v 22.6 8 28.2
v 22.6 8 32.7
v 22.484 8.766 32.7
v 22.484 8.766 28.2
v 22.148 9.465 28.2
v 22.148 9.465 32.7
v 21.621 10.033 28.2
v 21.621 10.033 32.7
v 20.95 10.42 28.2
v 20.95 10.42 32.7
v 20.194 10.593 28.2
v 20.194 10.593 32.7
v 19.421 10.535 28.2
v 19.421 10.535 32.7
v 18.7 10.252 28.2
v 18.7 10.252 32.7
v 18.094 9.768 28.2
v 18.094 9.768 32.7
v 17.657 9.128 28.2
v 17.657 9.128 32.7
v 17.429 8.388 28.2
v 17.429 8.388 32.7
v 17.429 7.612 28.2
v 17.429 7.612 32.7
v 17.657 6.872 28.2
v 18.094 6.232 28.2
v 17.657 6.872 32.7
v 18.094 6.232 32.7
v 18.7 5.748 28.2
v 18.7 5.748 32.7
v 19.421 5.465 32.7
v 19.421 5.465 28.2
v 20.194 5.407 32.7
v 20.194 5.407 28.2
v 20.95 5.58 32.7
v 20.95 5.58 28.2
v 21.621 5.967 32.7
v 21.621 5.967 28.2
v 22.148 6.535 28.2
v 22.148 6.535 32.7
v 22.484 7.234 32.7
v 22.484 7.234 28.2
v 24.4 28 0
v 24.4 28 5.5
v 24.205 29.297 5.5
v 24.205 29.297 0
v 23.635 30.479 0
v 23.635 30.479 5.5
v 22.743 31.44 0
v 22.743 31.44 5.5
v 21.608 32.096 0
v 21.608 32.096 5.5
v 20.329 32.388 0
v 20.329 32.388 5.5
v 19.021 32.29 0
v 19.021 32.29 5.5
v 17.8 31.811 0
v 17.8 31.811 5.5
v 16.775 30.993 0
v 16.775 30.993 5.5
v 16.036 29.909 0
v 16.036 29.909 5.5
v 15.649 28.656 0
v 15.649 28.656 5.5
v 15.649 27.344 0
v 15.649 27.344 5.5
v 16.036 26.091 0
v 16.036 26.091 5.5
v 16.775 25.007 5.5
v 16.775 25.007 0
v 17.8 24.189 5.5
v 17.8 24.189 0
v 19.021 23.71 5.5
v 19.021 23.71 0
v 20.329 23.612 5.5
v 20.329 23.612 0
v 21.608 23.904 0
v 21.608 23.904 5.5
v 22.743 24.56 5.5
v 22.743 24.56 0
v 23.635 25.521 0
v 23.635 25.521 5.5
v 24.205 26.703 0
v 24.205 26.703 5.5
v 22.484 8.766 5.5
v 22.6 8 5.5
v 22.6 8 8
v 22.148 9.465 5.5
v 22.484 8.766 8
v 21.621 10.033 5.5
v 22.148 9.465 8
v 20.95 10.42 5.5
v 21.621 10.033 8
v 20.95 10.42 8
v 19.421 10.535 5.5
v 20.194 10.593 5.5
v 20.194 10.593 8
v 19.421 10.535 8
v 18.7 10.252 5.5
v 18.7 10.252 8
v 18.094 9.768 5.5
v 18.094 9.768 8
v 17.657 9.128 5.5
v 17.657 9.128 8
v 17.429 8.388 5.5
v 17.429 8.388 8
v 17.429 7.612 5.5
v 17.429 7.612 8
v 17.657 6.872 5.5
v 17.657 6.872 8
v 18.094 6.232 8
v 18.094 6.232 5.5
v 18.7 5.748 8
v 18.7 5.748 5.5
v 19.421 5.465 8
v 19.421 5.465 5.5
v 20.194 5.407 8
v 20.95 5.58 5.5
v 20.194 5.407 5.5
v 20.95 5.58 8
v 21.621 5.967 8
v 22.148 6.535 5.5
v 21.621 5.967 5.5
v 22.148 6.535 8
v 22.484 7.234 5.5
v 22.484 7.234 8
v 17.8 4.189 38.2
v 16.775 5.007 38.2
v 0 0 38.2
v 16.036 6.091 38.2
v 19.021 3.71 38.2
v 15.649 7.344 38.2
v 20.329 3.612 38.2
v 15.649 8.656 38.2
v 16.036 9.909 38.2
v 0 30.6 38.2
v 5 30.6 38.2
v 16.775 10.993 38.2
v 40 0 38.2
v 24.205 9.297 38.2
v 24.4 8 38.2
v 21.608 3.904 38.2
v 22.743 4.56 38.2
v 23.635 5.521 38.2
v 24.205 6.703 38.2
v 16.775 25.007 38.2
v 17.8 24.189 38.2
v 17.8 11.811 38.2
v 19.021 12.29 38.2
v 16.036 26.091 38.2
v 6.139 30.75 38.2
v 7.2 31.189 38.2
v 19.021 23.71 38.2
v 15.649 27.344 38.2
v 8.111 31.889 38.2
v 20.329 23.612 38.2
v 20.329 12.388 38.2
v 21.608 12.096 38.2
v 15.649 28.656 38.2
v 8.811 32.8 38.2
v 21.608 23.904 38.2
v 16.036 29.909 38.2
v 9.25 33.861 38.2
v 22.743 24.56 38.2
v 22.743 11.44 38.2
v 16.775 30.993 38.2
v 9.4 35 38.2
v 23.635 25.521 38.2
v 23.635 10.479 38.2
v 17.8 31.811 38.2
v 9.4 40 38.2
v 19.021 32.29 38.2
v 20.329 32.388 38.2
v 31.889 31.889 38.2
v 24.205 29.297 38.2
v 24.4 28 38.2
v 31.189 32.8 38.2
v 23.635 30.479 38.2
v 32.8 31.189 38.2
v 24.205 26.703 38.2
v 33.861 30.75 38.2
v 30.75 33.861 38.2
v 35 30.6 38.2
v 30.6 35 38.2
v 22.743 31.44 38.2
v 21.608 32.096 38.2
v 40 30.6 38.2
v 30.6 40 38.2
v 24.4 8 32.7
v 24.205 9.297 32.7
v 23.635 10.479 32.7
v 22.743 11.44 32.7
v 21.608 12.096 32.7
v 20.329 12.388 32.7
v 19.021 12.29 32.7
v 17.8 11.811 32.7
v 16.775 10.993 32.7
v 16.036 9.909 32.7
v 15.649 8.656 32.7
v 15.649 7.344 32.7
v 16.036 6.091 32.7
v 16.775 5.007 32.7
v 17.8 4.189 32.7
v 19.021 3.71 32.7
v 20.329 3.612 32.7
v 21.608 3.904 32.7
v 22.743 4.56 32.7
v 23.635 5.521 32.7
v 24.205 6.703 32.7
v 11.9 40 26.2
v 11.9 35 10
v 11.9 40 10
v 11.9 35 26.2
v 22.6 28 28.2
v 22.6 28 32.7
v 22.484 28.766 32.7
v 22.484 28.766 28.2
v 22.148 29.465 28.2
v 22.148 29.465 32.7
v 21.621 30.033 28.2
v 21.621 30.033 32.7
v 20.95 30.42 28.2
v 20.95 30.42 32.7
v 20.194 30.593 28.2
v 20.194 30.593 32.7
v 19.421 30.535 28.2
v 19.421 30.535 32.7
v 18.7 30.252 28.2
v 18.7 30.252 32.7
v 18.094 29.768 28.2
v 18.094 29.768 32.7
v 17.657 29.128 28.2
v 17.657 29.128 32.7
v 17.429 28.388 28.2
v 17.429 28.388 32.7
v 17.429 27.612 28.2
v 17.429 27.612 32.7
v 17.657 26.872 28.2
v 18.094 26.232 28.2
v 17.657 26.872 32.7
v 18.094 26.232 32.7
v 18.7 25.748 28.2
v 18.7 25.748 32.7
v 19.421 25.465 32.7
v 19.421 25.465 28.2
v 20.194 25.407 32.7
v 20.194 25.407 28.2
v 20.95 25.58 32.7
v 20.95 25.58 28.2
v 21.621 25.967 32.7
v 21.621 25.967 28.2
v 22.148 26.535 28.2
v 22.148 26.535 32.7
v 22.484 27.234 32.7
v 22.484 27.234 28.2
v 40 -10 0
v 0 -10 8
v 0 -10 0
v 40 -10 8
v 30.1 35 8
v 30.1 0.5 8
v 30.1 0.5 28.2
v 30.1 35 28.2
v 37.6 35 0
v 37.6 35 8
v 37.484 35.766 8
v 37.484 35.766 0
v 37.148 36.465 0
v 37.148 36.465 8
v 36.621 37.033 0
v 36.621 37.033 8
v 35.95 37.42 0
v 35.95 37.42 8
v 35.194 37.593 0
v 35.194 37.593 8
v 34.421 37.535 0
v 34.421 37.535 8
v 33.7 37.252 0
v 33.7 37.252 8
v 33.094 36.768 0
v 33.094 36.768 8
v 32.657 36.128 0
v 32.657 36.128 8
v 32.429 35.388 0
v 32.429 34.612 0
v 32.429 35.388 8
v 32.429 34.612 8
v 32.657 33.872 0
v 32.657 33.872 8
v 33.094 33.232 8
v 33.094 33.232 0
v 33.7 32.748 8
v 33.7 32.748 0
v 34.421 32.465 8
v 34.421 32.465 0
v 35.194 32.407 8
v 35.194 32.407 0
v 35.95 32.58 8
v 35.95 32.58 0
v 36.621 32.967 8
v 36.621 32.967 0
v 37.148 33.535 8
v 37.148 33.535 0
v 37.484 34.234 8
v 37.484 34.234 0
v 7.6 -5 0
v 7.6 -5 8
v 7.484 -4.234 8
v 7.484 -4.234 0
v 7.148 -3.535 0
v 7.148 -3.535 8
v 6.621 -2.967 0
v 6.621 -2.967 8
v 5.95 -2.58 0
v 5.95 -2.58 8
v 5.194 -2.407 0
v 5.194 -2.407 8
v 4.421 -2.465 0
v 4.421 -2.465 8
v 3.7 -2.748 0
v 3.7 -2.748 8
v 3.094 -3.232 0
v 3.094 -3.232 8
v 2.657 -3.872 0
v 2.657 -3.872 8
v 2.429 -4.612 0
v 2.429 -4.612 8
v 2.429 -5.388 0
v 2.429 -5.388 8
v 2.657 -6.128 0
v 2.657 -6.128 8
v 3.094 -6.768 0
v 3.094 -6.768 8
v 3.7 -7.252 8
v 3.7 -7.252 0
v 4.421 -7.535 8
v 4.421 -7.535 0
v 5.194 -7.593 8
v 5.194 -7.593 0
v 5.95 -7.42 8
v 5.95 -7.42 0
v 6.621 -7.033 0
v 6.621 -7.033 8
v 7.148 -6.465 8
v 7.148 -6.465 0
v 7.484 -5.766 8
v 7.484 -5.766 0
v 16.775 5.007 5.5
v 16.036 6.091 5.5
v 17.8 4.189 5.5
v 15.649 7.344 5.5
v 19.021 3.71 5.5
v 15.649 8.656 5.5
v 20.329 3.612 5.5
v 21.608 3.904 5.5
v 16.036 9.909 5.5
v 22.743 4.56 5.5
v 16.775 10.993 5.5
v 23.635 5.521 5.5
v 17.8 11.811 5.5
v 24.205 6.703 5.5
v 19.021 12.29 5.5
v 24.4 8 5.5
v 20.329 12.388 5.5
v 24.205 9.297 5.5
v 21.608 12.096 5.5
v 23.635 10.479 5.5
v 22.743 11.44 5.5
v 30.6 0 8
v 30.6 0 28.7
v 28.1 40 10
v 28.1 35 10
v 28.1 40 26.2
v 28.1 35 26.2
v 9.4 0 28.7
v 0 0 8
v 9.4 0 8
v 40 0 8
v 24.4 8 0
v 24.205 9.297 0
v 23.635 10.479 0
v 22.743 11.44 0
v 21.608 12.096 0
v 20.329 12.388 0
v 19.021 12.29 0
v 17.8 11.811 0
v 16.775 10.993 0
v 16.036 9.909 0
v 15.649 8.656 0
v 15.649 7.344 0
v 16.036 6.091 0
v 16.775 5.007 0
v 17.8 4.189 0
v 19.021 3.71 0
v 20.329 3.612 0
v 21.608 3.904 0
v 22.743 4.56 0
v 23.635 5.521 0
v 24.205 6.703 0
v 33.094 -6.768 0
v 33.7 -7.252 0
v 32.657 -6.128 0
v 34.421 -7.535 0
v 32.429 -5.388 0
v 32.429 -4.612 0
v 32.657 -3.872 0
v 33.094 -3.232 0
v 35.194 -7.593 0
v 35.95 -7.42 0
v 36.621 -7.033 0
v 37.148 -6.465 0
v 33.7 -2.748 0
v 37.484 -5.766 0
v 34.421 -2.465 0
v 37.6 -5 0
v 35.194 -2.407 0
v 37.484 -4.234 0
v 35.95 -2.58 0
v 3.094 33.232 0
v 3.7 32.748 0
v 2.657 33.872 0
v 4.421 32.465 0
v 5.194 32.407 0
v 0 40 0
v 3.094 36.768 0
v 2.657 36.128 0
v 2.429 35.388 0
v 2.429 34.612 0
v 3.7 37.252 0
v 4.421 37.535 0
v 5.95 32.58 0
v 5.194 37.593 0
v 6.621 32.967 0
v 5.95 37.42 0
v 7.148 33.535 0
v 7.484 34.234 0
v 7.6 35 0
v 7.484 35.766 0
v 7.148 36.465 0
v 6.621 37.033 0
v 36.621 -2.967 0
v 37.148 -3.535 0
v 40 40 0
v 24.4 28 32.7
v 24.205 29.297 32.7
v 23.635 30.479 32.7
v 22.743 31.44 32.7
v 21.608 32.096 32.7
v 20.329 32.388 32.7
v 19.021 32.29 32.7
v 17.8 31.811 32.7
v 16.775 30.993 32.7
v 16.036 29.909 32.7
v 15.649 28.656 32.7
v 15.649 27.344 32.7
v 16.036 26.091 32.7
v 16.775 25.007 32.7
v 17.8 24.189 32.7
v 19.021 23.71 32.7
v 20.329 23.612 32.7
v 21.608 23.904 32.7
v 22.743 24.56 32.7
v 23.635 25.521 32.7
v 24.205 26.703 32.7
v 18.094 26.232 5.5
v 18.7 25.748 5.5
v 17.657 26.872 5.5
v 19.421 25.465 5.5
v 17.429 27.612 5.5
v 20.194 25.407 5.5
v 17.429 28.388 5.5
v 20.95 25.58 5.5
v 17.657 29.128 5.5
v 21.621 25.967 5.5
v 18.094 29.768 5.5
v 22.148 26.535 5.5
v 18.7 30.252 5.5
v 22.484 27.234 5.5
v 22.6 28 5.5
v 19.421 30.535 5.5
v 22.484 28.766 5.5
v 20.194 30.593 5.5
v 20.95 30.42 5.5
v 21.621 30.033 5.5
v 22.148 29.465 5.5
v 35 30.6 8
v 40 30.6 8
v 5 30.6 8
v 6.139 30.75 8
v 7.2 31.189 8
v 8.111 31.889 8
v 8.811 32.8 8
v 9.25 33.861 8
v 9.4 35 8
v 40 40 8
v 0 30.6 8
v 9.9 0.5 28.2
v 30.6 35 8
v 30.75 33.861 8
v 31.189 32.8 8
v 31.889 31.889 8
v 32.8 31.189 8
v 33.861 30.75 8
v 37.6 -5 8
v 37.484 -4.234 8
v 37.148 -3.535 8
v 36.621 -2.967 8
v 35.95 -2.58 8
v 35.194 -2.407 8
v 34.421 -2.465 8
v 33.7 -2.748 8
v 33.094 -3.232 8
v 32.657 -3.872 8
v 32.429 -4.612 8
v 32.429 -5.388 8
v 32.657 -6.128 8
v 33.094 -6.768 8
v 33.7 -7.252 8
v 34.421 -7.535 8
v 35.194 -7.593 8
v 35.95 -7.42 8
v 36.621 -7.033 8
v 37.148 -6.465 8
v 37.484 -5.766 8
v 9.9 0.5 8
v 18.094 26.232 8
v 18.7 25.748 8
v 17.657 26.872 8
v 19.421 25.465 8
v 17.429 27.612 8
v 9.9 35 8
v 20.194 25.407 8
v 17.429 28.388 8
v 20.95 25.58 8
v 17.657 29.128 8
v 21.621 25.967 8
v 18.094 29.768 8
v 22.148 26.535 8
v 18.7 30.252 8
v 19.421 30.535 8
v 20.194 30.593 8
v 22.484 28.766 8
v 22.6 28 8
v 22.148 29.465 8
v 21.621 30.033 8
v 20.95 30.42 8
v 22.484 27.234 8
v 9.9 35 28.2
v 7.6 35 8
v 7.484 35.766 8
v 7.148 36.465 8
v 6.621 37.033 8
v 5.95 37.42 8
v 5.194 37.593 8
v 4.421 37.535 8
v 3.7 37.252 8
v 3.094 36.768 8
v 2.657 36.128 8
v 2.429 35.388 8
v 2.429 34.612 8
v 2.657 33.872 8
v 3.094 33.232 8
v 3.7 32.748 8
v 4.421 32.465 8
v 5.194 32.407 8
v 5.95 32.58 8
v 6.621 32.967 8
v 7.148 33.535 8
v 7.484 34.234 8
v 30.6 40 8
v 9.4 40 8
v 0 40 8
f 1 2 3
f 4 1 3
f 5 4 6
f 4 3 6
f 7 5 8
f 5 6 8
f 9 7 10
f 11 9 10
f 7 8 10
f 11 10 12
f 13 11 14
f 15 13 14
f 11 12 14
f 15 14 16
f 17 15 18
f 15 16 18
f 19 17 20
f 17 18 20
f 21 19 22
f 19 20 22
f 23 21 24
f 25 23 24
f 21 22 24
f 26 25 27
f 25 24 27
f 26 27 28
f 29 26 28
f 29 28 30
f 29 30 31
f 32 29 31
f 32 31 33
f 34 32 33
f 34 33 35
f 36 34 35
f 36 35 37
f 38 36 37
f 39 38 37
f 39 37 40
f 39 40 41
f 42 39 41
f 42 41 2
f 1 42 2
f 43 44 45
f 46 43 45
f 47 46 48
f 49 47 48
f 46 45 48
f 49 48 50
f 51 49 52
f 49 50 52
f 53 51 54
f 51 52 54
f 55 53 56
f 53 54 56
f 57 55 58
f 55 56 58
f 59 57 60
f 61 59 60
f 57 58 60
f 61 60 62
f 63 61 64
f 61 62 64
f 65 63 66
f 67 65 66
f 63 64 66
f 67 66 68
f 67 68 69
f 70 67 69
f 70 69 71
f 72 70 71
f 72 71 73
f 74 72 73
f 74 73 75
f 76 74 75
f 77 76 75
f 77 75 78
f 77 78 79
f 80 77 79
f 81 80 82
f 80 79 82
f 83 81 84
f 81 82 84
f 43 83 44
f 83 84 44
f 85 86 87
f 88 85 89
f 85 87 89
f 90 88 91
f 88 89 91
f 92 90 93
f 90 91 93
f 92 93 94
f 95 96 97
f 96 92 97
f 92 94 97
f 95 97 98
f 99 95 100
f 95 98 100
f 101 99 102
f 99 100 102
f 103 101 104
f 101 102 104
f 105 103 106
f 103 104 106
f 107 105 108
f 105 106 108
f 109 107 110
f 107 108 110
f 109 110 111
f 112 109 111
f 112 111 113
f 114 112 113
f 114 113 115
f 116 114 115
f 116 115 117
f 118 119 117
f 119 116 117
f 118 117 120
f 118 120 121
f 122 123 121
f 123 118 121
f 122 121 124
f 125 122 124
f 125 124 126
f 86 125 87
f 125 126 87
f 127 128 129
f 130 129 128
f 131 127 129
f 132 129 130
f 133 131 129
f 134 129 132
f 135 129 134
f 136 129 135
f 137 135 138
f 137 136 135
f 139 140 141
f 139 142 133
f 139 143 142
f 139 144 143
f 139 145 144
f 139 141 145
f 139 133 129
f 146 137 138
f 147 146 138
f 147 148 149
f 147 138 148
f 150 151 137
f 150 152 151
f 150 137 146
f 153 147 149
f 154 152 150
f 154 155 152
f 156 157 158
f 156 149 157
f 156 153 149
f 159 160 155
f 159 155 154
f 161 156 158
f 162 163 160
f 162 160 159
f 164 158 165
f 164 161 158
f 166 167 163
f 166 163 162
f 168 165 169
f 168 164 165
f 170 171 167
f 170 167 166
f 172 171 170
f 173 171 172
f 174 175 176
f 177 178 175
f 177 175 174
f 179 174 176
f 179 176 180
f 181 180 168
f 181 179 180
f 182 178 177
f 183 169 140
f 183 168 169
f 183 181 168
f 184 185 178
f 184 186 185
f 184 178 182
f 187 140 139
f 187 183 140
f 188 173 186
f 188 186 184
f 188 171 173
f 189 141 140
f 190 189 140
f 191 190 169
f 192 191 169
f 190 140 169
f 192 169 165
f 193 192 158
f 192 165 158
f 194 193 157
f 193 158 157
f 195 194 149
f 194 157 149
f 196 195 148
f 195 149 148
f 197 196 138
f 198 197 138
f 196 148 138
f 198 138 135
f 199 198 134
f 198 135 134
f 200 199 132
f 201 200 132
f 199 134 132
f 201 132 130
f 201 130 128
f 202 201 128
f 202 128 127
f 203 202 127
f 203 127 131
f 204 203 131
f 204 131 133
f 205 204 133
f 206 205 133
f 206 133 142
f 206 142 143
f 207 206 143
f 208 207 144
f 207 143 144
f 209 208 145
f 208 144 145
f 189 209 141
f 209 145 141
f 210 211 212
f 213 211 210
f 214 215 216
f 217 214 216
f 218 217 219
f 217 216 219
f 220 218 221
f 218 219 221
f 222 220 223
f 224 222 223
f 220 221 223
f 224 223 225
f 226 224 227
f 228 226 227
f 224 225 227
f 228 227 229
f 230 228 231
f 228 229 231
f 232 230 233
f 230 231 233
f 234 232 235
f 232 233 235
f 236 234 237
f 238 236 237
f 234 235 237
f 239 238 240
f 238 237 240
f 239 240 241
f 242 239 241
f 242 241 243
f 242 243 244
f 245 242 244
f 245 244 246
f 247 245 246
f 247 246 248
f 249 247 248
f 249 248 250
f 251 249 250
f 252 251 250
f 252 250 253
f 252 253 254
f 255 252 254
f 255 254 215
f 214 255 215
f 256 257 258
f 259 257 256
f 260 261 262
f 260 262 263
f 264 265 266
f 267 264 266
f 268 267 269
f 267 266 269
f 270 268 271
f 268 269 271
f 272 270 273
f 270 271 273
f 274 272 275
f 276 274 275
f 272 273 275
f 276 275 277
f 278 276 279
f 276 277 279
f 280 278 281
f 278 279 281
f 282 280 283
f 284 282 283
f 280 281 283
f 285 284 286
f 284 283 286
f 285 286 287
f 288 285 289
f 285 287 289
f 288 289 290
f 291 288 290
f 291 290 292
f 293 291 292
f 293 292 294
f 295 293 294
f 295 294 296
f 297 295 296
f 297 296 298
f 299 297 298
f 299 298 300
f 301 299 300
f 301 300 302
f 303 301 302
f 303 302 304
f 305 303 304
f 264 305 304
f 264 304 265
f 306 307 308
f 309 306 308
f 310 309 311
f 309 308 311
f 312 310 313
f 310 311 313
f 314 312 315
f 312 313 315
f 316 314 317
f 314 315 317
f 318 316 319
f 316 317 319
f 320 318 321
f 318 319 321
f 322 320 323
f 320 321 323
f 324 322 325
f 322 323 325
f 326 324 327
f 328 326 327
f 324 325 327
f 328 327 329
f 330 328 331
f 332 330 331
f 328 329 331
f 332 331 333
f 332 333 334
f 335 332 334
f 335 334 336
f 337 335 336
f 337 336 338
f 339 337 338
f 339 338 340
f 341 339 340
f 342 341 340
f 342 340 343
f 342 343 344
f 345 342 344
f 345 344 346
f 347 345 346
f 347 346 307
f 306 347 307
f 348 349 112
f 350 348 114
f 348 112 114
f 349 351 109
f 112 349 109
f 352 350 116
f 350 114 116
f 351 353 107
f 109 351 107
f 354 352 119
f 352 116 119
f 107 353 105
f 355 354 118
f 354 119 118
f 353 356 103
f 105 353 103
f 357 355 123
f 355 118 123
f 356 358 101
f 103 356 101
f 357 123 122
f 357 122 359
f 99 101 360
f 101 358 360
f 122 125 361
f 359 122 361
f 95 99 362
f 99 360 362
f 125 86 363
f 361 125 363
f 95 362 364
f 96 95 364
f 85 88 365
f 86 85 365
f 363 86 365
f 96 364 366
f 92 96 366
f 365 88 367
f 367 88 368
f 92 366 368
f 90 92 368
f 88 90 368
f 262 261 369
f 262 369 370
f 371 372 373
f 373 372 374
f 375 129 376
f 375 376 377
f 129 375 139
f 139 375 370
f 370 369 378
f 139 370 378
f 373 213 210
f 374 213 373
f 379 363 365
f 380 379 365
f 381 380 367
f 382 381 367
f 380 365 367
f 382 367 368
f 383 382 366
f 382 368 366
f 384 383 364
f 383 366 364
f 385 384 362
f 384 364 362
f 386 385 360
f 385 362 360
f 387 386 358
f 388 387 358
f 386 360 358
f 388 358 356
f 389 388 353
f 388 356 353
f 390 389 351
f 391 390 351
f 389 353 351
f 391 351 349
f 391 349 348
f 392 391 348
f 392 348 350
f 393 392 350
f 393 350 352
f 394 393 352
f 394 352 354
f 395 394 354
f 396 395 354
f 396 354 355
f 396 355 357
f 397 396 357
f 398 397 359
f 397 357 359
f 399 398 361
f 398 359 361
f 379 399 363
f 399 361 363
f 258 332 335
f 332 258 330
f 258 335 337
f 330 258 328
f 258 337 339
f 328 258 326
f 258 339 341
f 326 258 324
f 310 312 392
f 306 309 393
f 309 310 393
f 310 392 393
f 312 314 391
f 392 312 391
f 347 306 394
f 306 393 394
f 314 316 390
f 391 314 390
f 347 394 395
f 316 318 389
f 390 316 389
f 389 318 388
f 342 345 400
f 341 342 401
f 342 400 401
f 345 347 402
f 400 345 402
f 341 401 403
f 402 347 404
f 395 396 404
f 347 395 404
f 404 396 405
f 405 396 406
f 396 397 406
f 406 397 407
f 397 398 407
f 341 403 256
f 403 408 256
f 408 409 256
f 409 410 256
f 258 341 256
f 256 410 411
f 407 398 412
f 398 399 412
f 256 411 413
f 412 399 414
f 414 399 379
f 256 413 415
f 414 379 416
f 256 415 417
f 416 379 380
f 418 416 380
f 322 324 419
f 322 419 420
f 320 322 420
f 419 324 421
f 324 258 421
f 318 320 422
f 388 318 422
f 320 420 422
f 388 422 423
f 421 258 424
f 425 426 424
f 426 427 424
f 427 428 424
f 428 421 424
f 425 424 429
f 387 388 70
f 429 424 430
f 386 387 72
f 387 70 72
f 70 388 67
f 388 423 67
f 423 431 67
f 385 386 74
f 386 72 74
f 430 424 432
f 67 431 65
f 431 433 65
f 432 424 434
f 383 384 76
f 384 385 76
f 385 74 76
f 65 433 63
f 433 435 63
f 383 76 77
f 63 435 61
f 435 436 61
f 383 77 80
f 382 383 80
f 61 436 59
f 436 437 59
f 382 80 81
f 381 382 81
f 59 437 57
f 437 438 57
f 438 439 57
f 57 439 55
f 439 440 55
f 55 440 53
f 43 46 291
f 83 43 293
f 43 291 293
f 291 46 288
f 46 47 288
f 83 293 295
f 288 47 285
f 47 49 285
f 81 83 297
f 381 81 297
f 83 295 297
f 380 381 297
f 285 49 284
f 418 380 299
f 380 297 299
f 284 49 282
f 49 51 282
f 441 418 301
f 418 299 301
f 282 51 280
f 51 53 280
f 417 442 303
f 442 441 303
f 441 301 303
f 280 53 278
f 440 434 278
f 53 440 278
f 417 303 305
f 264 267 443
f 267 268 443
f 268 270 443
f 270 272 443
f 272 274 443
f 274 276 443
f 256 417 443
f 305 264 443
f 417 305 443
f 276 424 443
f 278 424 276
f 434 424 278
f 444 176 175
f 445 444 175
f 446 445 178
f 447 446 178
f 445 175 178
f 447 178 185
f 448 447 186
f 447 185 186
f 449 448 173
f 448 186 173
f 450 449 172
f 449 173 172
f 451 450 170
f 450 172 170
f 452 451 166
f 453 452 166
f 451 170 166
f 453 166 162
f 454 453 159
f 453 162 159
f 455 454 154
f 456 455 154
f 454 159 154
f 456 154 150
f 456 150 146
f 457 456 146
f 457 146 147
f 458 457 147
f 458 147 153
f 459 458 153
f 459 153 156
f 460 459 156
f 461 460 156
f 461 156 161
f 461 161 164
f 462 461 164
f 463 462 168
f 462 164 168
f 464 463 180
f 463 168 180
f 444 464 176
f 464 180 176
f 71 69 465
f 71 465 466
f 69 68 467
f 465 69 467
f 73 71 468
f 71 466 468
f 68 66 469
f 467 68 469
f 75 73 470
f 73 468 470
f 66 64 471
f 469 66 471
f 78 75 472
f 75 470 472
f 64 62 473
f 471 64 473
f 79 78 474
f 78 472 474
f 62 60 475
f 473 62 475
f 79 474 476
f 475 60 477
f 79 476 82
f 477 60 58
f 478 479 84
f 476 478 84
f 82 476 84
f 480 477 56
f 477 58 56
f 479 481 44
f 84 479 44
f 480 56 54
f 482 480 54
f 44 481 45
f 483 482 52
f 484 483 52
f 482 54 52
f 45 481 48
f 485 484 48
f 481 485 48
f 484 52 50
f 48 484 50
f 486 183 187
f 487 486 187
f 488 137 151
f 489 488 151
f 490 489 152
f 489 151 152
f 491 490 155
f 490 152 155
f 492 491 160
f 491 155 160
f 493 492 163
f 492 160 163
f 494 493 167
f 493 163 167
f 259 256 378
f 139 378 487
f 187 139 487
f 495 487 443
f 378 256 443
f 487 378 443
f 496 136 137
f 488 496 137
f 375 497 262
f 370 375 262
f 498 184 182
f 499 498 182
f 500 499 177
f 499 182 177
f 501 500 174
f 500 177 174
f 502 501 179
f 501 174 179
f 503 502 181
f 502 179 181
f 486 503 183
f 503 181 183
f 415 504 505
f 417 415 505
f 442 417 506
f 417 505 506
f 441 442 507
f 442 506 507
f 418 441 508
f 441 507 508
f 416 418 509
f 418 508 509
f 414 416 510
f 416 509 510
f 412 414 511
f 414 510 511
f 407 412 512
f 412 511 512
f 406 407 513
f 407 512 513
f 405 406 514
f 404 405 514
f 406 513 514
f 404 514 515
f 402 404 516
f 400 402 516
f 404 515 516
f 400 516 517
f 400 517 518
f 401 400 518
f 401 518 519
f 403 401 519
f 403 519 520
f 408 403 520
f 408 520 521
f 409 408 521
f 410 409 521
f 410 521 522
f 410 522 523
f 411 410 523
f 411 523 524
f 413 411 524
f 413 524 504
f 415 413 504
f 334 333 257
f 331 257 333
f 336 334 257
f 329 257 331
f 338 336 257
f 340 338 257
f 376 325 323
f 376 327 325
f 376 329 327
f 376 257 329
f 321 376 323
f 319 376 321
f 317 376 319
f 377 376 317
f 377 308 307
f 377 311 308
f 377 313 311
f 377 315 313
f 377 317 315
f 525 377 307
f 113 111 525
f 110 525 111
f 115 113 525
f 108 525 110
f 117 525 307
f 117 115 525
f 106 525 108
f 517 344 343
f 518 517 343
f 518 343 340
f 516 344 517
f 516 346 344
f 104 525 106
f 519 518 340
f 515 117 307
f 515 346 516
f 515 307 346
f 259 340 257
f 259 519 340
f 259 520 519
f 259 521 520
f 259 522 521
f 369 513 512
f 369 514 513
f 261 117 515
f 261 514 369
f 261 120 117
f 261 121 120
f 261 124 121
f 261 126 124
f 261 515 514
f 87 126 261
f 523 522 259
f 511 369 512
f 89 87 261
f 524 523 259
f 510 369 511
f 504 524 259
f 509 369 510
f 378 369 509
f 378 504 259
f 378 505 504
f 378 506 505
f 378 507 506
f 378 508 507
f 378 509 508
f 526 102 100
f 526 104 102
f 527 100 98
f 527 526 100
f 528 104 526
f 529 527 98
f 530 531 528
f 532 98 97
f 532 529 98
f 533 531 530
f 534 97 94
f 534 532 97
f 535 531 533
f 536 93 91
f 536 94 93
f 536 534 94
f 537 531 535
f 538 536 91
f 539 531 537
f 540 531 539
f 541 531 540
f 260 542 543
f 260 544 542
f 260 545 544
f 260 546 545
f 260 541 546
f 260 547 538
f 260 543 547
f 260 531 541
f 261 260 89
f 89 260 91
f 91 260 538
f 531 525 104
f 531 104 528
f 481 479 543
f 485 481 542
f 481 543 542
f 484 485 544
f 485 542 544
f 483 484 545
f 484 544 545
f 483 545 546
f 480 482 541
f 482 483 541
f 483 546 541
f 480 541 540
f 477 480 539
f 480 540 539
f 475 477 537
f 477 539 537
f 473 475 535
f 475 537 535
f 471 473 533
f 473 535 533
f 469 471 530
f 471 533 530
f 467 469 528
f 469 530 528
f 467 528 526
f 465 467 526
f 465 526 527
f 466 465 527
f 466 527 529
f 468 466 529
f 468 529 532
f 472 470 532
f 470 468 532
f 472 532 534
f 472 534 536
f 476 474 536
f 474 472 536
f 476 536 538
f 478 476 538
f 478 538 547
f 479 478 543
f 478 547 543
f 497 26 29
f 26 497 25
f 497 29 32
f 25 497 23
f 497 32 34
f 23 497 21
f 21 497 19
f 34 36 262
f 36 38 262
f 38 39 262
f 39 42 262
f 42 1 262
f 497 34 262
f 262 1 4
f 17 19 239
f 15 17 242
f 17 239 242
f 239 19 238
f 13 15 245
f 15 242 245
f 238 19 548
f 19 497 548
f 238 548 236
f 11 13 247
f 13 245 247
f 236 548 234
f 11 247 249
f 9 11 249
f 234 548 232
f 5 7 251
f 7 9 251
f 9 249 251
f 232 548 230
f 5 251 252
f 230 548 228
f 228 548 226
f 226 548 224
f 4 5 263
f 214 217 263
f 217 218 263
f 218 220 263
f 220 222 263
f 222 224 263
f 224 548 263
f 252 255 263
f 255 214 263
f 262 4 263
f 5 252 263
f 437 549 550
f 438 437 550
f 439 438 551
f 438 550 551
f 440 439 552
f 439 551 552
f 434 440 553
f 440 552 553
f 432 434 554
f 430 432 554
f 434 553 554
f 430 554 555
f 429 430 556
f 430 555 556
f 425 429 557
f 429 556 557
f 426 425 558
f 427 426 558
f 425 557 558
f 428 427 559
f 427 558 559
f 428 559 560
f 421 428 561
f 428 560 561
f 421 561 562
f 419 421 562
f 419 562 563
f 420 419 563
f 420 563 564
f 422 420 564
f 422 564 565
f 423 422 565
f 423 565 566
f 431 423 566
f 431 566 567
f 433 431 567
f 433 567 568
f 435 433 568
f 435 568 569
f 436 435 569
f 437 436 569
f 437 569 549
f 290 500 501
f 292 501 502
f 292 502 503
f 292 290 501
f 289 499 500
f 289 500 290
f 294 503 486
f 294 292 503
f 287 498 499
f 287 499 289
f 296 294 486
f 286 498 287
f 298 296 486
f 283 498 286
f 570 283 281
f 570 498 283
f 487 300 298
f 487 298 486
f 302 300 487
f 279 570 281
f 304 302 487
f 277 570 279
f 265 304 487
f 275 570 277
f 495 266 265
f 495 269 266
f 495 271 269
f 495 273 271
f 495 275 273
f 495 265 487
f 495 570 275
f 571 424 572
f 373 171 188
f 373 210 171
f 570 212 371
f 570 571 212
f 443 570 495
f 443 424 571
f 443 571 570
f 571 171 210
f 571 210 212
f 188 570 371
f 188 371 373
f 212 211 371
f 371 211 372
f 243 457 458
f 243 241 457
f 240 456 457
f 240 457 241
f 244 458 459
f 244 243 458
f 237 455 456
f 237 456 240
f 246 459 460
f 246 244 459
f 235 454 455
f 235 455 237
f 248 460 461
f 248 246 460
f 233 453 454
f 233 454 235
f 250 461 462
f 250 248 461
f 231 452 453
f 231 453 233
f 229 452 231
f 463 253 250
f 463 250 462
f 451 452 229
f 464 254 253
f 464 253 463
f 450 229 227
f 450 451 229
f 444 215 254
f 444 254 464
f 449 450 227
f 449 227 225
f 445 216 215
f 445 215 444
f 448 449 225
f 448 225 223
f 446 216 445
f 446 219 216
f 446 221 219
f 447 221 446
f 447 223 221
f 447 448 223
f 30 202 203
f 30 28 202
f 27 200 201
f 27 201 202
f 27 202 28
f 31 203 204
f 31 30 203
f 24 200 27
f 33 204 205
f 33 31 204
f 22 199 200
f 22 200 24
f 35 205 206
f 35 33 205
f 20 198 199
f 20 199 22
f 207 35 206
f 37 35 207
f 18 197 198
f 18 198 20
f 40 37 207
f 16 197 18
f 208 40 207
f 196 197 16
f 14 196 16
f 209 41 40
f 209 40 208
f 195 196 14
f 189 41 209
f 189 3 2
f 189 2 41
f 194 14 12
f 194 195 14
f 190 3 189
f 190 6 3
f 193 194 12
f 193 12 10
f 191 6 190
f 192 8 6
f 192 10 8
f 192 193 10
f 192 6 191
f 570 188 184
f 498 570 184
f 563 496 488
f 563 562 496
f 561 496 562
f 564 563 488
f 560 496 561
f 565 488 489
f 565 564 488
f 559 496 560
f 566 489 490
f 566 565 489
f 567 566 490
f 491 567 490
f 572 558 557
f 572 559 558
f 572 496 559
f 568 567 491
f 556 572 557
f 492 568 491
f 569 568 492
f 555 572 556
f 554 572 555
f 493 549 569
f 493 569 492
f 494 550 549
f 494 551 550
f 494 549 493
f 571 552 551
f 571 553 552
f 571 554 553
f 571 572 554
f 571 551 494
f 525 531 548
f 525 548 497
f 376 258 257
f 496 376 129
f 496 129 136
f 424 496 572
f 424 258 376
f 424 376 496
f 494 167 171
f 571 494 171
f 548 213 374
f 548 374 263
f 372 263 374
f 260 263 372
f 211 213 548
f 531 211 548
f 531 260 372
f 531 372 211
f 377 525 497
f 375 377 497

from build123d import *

# Parameters (mm, degrees)
SKETCH1_W           = 40
SKETCH1_H           = 40
BOSS_EXTRUDE1_DEPTH = 8
SKETCH6_W           = 40
SKETCH6_H           = 8
BOSS_EXTRUDE4_DEPTH = 10
BOSS_EXTRUDE2_DEPTH = 20.2
SKETCH3_W           = 40
SKETCH3_H           = 40
BOSS_EXTRUDE3_DEPTH = 10
SKETCH4_R           = 2.6
CUT_EXTRUDE1_DEPTH  = 69.258625829
SKETCH5_R           = 4.4
SKETCH5_R_2         = 2.6
CUT_EXTRUDE2_DEPTH  = 30.2
SKETCH5_3_R         = 4.4
SKETCH5_3_R_2       = 2.6
CUT_EXTRUDE3_DEPTH  = 5.5
CUT_EXTRUDE4_START  = -32.7
SKETCH5_4_R         = 4.4
SKETCH5_4_R_2       = 2.6
CUT_EXTRUDE4_DEPTH  = 5.5
SKETCH7_W           = 16.2
SKETCH7_H           = 16.2
CUT_EXTRUDE5_DEPTH  = 10
CHAMFER1_SIZE       = 0.5


with BuildPart() as part:
    # Sketch1 → Boss-Extrude1 (new body)
    with BuildSketch(Plane.XY):
        with Locations((20, 20)):
            Rectangle(SKETCH1_W, SKETCH1_H)
    extrude(amount=BOSS_EXTRUDE1_DEPTH)

    # Sketch6 → Boss-Extrude4 (add)
    with BuildSketch(Plane.XZ):
        with Locations((20, 4)):
            Rectangle(SKETCH6_W, SKETCH6_H)
    extrude(amount=BOSS_EXTRUDE4_DEPTH)

    # Sketch2 → Boss-Extrude2 (add)
    with BuildSketch(Plane.XY.offset(8)):
        Polygon((0, 40), (10, 40), (30, 40), (40, 40), (40, 0), (30.1, 0), (30.1, 35), (9.9, 35), (9.9, 0), (0, 0), align=None)
    extrude(amount=BOSS_EXTRUDE2_DEPTH)

    # Sketch3 → Boss-Extrude3 (add)
    with BuildSketch(Plane.XY.offset(28.2)):
        with Locations((20, 20)):
            Rectangle(SKETCH3_W, SKETCH3_H)
    extrude(amount=BOSS_EXTRUDE3_DEPTH)

    # Sketch4 → Cut-Extrude1 (cut, through all)
    with BuildSketch(Plane.XY.offset(38.2)):
        with Locations((35, 35)):
            Circle(SKETCH4_R)
        with Locations((35, -5)):
            Circle(SKETCH4_R)
        with Locations((5, 35)):
            Circle(SKETCH4_R)
        with Locations((5, -5)):
            Circle(SKETCH4_R)
        with Locations((20, 28)):
            Circle(SKETCH4_R)
        with Locations((20, 8)):
            Circle(SKETCH4_R)
    extrude(amount=-CUT_EXTRUDE1_DEPTH, mode=Mode.SUBTRACT)

    # Sketch5 → Cut-Extrude2 (cut)
    # profile 1 of 8: a face of its own
    with BuildSketch(Plane.XY.offset(38.2)):
        with Locations((5, 35)):
            Circle(SKETCH5_R)
        with Locations((5, 35)):
            Circle(SKETCH5_R_2, mode=Mode.SUBTRACT)
    # profile 2 of 8: a face of its own
    with BuildSketch(Plane.XY.offset(38.2)):
        with Locations((35, 35)):
            Circle(SKETCH5_R)
        with Locations((35, 35)):
            Circle(SKETCH5_R_2, mode=Mode.SUBTRACT)
    # profile 3 of 8: a face of its own
    with BuildSketch(Plane.XY.offset(38.2)):
        with Locations((35, -5)):
            Circle(SKETCH5_R)
    # profile 4 of 8: a face of its own
    with BuildSketch(Plane.XY.offset(38.2)):
        with Locations((5, -5)):
            Circle(SKETCH5_R)
    # profile 5 of 8: a face of its own
    with BuildSketch(Plane.XY.offset(38.2)):
        with BuildLine():
            ThreePointArc((5, 30.6), (1.888730163, 38.111269837), (9.4, 35))
            Line((9.4, 35), (9.4, 40))
            Line((9.4, 40), (0, 40))
            Line((0, 40), (0, 30.6))
            Line((0, 30.6), (5, 30.6))
        make_face()
    # profile 6 of 8: a face of its own
    with BuildSketch(Plane.XY.offset(38.2)):
        with BuildLine():
            Line((40, 40), (30.6, 40))
            Line((30.6, 40), (30.6, 35))
            ThreePointArc((30.6, 35), (35, 39.4), (39.4, 35))
            ThreePointArc((39.4, 35), (38.111269837, 31.888730163), (35, 30.6))
            Line((35, 30.6), (40, 30.6))
            Line((40, 30.6), (40, 40))
        make_face()
    # profile 7 of 8: a face of its own
    with BuildSketch(Plane.XY.offset(38.2)):
        with Locations((35, -5)):
            Circle(SKETCH5_R)
    # profile 8 of 8: a face of its own
    with BuildSketch(Plane.XY.offset(38.2)):
        with Locations((5, -5)):
            Circle(SKETCH5_R)
    extrude(amount=-CUT_EXTRUDE2_DEPTH, mode=Mode.SUBTRACT)

    # Sketch5<3> → Cut-Extrude3 (cut)
    # profile 1 of 2: a face of its own
    with BuildSketch(Plane.XY.offset(38.2)):
        with Locations((20, 28)):
            Circle(SKETCH5_3_R)
        with Locations((20, 28)):
            Circle(SKETCH5_3_R_2, mode=Mode.SUBTRACT)
    # profile 2 of 2: a face of its own
    with BuildSketch(Plane.XY.offset(38.2)):
        with Locations((20, 8)):
            Circle(SKETCH5_3_R)
        with Locations((20, 8)):
            Circle(SKETCH5_3_R_2, mode=Mode.SUBTRACT)
    extrude(amount=-CUT_EXTRUDE3_DEPTH, mode=Mode.SUBTRACT)

    # Sketch5<4> → Cut-Extrude4 (cut)
    # profile 1 of 2: a face of its own
    with BuildSketch(Plane.XY.offset(38.2).offset(CUT_EXTRUDE4_START)):
        with Locations((20, 28)):
            Circle(SKETCH5_4_R)
        with Locations(Location((20, 28, 0), (0, 0, 180))):
            Circle(SKETCH5_4_R_2, mode=Mode.SUBTRACT)
    # profile 2 of 2: a face of its own
    with BuildSketch(Plane.XY.offset(38.2).offset(CUT_EXTRUDE4_START)):
        with Locations((20, 8)):
            Circle(SKETCH5_4_R)
        with Locations(Location((20, 8, 0), (0, 0, 180))):
            Circle(SKETCH5_4_R_2, mode=Mode.SUBTRACT)
    extrude(amount=-CUT_EXTRUDE4_DEPTH, mode=Mode.SUBTRACT)

    # Sketch7 → Cut-Extrude5 (cut)
    with BuildSketch(Plane.XZ.offset(-35)):
        with Locations((20, 18.1)):
            Rectangle(SKETCH7_W, SKETCH7_H)
    extrude(amount=-CUT_EXTRUDE5_DEPTH, mode=Mode.SUBTRACT)

    # Chamfer1
    chamfer1_edges = [part.edges().sort_by_distance(p)[0] for p in [
        (9.9, 0, 18.1),
        (30.1, 0, 18.1),
        (20, 0, 28.2),
    ]]
    chamfer(chamfer1_edges, length=CHAMFER1_SIZE)


solid = part.part
